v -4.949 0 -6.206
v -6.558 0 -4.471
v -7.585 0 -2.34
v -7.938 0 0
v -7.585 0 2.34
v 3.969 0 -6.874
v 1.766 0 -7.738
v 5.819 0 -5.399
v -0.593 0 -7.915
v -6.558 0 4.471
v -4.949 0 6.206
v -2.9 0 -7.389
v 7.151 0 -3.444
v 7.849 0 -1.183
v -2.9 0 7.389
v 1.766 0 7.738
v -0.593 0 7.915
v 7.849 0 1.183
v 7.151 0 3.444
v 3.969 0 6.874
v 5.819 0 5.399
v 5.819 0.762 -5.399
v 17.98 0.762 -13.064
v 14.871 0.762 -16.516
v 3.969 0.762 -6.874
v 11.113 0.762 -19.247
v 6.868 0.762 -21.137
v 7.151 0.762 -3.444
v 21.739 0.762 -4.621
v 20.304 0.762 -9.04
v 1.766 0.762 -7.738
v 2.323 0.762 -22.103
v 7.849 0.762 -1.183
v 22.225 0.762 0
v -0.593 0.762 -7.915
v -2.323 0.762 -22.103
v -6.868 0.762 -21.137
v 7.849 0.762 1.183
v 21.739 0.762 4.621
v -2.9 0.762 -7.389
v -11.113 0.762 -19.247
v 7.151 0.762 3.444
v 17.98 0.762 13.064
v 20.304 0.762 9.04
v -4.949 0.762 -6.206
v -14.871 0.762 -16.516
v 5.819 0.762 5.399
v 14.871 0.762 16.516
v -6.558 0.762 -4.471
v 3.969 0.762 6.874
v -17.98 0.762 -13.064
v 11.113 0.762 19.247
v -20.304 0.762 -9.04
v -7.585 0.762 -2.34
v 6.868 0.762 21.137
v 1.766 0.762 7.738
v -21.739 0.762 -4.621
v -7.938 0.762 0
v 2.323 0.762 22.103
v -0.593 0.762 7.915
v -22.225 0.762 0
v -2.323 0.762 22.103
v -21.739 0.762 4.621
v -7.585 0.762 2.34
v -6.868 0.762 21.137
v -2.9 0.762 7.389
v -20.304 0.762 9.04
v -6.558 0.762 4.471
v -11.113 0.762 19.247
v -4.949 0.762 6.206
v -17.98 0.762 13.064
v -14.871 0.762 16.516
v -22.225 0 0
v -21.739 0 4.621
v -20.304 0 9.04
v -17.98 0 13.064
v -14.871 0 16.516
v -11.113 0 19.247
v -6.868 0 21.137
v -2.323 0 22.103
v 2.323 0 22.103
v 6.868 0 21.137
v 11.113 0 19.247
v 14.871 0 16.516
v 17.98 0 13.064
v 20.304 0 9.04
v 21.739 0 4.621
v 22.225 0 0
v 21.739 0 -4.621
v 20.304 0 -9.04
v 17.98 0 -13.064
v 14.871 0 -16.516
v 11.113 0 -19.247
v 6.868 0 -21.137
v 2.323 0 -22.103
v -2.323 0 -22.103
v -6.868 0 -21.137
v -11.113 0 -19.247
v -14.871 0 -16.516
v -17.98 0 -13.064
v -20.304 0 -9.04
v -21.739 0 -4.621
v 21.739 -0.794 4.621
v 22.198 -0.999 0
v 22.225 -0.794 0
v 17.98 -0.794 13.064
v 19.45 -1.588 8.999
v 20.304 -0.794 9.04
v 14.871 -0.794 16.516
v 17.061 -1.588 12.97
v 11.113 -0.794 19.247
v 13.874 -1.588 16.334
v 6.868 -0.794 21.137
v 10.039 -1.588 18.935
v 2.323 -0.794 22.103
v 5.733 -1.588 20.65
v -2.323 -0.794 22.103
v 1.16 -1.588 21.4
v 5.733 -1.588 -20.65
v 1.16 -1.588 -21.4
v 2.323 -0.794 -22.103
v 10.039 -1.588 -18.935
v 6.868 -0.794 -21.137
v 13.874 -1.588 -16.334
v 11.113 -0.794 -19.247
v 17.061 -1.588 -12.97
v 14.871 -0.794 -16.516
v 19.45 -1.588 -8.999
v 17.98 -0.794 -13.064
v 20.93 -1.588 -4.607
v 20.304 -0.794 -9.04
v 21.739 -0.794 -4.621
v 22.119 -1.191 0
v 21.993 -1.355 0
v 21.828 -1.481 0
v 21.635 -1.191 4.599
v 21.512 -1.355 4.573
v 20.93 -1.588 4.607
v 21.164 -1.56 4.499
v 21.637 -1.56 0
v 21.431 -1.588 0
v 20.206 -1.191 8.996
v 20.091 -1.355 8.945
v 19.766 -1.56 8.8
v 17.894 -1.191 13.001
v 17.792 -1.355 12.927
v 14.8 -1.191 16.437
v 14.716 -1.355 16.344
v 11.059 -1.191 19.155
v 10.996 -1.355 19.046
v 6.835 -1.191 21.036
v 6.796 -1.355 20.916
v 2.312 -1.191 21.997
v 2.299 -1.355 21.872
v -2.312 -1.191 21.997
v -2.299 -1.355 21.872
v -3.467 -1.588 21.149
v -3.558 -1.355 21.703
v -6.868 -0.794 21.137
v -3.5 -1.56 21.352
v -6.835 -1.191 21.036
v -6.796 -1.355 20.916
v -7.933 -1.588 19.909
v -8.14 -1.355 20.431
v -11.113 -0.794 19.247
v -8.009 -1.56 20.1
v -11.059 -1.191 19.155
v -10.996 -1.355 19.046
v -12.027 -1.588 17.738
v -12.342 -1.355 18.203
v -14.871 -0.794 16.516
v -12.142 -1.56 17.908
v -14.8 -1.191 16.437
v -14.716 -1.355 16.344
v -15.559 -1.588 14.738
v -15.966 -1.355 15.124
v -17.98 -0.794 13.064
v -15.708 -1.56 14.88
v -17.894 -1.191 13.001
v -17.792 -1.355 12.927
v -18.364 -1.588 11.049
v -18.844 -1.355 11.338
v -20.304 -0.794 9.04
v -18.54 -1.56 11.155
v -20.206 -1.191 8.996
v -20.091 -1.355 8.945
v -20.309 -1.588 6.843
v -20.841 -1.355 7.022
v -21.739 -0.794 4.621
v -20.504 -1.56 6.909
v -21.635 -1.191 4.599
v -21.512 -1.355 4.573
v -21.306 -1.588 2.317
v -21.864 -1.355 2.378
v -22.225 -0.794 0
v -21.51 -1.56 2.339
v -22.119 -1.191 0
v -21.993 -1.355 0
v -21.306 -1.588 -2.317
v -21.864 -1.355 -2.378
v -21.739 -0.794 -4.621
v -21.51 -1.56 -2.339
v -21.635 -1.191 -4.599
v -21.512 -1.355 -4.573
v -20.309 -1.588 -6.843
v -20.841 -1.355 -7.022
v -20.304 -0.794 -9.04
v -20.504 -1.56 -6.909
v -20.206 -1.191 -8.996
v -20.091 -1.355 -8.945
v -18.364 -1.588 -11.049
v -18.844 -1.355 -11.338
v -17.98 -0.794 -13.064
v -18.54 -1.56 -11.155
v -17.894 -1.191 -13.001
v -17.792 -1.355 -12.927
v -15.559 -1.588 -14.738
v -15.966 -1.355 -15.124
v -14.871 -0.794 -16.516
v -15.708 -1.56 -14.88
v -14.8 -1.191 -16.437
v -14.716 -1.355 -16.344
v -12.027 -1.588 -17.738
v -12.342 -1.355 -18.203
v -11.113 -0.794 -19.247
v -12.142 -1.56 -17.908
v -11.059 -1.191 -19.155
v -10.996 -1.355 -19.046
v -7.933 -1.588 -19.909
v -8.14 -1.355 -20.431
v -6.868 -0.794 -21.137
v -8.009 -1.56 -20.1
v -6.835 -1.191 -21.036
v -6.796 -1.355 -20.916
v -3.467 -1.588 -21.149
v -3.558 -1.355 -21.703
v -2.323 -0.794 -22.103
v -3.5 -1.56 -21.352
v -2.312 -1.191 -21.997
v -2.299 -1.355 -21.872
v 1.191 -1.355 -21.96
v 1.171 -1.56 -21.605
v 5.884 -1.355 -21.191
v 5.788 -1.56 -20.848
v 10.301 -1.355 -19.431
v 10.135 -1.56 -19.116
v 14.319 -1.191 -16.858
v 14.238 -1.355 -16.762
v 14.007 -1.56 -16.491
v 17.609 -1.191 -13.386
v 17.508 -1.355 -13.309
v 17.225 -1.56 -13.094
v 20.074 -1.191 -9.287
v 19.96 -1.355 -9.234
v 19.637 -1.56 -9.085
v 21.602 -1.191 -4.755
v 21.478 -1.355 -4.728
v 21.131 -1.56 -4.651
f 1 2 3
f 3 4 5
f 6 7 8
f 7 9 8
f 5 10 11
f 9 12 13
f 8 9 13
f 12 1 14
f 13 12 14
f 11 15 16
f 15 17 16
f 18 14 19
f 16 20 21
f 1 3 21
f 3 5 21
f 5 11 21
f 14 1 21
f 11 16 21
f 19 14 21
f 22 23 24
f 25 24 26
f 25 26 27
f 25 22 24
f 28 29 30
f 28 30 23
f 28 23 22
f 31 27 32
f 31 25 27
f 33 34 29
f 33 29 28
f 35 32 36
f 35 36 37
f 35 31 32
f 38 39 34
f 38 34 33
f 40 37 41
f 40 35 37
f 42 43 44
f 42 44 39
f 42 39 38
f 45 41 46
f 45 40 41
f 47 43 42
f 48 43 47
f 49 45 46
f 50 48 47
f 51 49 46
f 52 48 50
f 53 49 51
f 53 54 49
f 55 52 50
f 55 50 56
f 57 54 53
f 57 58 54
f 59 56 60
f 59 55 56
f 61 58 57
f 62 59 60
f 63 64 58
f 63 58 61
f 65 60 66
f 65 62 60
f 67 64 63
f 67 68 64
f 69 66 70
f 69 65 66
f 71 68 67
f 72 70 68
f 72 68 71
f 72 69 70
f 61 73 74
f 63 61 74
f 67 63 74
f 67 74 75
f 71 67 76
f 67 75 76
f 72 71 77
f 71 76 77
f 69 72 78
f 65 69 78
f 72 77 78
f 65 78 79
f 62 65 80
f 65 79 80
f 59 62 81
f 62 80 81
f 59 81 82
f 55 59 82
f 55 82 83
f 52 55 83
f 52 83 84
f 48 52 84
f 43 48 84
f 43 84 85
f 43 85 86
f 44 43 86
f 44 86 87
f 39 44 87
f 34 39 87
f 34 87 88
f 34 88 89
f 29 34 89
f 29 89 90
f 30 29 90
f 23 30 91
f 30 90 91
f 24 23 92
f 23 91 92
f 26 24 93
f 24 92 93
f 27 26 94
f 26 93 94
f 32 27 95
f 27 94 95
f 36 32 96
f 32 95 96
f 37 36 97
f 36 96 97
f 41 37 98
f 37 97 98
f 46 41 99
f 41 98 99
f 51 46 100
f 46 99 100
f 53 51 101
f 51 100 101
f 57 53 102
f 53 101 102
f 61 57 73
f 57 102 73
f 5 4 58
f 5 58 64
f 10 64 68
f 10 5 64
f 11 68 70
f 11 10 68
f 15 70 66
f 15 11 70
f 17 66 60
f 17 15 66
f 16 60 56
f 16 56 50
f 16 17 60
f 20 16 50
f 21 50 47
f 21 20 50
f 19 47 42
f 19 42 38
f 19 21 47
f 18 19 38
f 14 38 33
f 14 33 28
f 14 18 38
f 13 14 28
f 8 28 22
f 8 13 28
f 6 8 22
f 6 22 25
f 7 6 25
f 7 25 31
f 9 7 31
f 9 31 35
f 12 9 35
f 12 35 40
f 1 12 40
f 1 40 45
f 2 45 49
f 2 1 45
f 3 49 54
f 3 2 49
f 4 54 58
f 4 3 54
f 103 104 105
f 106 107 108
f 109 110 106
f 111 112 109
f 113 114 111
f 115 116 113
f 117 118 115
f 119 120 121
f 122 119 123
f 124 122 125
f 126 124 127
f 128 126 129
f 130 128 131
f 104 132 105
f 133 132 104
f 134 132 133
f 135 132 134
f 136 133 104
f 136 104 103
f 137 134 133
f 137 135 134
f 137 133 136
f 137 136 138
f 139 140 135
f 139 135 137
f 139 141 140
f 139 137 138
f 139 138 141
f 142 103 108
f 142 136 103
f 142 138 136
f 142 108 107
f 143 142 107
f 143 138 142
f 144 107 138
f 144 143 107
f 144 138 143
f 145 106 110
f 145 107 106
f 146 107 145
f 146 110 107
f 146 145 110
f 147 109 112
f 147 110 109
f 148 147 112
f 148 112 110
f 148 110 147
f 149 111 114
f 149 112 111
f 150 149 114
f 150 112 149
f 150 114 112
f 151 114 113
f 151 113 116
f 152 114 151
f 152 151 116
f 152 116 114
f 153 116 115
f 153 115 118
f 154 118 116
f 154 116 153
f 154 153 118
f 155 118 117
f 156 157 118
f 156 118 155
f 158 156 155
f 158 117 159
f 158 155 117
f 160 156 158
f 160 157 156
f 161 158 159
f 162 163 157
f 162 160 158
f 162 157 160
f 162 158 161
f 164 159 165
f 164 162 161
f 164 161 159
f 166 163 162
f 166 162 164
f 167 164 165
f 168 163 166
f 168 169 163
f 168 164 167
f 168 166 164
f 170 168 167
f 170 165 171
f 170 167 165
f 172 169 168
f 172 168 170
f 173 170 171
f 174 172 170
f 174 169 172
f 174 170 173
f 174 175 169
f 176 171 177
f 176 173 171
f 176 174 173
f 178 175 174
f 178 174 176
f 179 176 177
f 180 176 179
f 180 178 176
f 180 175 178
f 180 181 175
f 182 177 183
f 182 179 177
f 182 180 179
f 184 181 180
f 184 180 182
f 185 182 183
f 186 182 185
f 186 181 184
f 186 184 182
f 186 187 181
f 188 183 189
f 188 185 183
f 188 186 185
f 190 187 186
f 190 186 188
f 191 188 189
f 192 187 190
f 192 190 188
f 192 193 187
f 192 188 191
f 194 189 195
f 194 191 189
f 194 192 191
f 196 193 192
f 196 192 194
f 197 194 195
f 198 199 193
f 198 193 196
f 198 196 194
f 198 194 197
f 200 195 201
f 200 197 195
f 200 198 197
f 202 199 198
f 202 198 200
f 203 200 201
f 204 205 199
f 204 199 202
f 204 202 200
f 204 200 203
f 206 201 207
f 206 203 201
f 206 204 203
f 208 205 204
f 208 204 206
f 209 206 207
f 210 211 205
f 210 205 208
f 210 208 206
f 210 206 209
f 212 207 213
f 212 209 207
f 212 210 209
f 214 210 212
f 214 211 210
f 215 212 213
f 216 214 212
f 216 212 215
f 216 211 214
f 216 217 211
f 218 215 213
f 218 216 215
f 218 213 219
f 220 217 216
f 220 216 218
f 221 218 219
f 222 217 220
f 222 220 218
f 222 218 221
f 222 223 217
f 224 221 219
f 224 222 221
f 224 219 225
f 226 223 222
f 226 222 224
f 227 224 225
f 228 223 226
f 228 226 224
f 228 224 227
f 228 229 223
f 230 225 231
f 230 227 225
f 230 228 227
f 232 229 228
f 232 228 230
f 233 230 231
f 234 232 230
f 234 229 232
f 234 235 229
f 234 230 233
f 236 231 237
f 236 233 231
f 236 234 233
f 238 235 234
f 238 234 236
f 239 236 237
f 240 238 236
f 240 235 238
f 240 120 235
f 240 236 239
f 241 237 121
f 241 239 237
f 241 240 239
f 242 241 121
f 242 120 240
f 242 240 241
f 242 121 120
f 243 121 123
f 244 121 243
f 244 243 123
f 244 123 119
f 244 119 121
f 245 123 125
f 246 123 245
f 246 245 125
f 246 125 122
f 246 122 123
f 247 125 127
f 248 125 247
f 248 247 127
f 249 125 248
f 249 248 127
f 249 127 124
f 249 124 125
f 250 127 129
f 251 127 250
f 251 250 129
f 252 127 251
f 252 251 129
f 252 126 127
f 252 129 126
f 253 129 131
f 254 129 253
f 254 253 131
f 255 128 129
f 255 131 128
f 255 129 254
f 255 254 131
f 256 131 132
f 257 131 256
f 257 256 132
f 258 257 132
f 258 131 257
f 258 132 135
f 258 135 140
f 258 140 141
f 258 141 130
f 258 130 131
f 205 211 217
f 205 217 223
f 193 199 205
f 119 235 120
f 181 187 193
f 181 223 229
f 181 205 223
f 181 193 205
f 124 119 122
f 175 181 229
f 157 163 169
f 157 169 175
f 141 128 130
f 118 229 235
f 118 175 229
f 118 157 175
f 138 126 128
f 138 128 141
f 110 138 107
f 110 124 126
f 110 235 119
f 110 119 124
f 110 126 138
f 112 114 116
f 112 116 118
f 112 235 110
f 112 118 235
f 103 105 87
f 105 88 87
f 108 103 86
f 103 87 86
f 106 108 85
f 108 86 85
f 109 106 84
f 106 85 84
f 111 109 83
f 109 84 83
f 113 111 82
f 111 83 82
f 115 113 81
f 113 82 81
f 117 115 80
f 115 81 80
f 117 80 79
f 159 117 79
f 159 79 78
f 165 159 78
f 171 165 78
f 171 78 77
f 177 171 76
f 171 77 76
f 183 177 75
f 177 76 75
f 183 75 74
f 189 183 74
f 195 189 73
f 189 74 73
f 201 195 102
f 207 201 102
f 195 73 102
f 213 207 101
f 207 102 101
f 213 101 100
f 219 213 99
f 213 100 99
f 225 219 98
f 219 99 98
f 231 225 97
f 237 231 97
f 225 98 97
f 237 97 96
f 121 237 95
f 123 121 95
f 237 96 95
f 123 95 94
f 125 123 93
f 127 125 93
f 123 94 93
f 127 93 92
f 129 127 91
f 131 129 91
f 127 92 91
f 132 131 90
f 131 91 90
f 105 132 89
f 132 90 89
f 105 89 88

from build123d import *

# Parameters (mm, degrees)
F0_R     = 22.225
F1_DEPTH = 1.5875
F2_R     = 0.79375
F3_R     = 22.225
F3_R_2   = 7.9375
F4_DEPTH = 0.762


with BuildPart() as f1:
    # F0 (on Front) → F1 (new body)
    with BuildSketch(Plane.XZ):
        Circle(F0_R)
    extrude(amount=F1_DEPTH)

    # F2
    f2_edges = [f1.edges().sort_by_distance(p)[0] for p in [
        (-22.225, -1.5875, 0),
    ]]
    fillet(f2_edges, radius=F2_R)

    # F3 (on face) → F4 (join)
    with BuildSketch(Plane(origin=(0, 0, 0), x_dir=(-1, 0, 0), z_dir=(0, 1, 0))):
        Circle(F3_R)
        Circle(F3_R_2, mode=Mode.SUBTRACT)
    extrude(amount=F4_DEPTH)


solid = f1.part
